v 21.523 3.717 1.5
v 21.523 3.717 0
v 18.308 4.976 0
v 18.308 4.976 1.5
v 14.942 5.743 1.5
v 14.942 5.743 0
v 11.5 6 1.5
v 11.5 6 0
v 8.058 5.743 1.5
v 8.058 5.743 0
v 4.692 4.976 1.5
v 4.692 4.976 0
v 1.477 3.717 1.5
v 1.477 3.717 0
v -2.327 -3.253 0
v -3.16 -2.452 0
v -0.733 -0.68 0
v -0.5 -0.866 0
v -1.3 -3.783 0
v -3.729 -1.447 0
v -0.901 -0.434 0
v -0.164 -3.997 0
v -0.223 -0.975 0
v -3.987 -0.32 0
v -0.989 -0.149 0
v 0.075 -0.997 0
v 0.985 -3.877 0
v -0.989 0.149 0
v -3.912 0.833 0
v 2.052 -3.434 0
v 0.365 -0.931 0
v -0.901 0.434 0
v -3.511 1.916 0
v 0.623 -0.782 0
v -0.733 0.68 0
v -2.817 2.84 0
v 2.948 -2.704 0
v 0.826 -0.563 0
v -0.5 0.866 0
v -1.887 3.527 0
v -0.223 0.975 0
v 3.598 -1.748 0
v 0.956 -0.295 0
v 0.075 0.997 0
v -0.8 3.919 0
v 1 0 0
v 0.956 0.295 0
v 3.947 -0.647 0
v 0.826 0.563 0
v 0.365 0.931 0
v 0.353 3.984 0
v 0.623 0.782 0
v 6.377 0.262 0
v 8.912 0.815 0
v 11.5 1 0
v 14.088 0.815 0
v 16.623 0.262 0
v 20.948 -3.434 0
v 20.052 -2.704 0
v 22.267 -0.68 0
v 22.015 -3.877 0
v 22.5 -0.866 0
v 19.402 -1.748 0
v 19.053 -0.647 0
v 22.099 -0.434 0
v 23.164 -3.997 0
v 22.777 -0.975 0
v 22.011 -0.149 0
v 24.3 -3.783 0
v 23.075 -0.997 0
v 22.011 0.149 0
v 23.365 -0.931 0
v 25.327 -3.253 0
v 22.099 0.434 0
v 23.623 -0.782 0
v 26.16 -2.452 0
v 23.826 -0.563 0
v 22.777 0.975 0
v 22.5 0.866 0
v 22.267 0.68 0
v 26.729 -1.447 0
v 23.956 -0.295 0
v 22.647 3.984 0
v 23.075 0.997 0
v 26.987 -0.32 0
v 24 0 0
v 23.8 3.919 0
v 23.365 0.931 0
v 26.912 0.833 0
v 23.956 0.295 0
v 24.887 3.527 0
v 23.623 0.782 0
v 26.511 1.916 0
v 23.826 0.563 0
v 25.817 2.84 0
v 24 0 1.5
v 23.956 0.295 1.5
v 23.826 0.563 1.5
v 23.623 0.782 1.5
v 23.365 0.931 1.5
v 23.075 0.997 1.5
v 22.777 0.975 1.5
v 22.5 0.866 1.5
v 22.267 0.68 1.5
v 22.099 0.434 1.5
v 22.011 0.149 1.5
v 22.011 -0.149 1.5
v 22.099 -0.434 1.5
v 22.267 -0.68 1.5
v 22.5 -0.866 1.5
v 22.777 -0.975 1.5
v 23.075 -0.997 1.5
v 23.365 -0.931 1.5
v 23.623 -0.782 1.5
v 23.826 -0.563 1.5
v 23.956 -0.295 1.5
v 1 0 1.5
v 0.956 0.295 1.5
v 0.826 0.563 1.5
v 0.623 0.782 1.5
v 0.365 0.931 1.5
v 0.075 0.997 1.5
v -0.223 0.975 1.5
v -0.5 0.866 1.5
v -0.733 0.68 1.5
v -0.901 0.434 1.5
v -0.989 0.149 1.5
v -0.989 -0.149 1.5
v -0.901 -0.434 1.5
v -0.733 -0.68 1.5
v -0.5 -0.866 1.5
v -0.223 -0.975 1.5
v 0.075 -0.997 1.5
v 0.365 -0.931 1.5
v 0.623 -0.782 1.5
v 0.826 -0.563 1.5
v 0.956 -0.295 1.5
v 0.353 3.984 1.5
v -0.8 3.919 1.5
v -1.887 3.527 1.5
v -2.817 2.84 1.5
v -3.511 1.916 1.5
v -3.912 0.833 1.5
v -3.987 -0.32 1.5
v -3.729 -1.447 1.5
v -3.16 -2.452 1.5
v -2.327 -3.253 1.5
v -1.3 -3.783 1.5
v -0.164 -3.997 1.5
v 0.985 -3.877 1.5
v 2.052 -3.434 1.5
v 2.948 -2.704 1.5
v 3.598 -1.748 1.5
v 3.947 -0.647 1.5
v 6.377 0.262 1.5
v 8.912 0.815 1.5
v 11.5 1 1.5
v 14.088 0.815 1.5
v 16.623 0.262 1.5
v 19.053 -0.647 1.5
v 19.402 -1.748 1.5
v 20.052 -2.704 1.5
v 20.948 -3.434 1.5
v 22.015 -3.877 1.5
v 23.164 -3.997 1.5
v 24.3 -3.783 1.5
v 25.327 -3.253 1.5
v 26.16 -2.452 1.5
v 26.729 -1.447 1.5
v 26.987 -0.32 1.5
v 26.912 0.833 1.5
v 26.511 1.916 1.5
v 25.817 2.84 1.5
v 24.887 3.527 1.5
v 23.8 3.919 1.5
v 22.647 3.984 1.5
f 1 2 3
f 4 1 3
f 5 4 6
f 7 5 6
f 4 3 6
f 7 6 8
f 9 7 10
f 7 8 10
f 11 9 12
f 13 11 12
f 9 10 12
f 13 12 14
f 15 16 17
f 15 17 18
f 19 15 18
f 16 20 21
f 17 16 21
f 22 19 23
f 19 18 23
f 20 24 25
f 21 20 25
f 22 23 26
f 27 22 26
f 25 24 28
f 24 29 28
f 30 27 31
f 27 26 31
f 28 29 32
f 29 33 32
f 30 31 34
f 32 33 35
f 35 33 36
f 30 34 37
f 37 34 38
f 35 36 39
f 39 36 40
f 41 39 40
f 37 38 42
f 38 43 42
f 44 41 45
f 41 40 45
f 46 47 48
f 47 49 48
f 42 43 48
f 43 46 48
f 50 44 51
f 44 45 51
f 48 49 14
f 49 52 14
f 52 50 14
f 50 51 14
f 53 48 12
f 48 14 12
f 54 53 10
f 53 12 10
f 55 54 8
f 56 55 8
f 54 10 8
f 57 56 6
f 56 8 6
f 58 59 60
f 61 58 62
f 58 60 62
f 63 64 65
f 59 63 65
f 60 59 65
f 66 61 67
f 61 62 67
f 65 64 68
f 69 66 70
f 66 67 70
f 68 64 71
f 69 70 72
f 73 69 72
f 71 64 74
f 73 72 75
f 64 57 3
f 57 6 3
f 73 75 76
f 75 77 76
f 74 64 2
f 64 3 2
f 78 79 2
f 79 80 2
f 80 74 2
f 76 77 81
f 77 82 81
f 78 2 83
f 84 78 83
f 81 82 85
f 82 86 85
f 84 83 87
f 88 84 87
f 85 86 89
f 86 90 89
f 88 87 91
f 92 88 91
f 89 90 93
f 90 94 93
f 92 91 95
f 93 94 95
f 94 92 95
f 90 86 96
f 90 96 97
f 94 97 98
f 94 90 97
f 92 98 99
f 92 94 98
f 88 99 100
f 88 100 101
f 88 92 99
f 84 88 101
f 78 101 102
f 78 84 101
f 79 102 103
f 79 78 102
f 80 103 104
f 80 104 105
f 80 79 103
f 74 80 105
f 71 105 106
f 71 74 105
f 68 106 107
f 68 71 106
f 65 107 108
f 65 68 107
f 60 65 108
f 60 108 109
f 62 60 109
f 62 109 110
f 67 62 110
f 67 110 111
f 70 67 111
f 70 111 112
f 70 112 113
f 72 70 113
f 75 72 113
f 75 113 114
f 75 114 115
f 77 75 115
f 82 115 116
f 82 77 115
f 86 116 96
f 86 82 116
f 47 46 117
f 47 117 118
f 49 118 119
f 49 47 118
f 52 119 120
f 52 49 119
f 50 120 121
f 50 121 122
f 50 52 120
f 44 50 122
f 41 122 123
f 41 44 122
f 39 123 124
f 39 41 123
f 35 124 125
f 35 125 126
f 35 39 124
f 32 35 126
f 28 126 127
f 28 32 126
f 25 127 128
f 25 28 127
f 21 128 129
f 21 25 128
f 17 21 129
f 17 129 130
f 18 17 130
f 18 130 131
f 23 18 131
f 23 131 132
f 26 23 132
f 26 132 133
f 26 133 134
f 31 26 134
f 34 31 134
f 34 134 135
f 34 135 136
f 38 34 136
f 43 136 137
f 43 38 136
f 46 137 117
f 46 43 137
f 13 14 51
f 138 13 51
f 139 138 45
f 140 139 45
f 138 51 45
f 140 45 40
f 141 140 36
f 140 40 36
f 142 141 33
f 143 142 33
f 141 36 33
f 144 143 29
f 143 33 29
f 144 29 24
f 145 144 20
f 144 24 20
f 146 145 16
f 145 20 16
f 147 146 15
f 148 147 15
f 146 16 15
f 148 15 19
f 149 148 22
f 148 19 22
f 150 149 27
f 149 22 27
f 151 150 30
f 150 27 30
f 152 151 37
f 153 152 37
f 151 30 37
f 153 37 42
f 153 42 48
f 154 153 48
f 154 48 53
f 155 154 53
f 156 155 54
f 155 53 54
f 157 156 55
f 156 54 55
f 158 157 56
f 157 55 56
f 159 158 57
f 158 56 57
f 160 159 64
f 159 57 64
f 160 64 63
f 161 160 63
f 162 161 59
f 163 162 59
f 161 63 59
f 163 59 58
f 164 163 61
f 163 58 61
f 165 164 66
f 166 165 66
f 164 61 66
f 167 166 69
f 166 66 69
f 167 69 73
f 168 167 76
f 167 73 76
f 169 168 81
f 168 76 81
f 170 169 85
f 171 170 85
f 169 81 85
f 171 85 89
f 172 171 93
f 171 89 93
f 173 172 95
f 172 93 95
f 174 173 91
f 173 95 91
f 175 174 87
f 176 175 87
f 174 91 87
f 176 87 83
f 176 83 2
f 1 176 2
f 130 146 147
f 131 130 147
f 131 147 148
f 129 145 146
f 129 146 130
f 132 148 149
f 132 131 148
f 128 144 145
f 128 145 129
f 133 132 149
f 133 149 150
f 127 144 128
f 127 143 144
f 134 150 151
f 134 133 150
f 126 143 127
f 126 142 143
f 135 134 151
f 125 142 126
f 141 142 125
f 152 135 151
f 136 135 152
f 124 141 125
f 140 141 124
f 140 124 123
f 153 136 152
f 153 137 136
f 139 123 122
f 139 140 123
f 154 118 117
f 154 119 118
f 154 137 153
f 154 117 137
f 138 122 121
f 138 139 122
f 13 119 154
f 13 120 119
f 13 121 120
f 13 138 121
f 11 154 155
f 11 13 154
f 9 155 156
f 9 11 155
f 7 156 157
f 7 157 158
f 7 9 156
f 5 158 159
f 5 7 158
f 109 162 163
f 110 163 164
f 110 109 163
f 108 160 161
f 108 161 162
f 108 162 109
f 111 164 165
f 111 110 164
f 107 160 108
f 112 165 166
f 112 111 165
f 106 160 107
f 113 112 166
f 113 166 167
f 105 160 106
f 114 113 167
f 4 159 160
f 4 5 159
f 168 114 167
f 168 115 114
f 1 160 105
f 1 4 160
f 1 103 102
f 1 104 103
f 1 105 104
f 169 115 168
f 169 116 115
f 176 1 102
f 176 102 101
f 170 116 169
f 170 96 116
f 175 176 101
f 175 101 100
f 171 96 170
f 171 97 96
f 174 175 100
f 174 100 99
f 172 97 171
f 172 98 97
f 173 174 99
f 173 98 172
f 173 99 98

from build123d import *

# Parameters (mm, degrees)
SKETCH1_R           = 1
BOSS_EXTRUDE1_DEPTH = 1.5


with BuildPart() as part:
    # Sketch1 → Boss-Extrude1 (new body)
    with BuildSketch(Plane.XY):
        with BuildLine():
            ThreePointArc((1.477428659, 3.717150059), (-3.481097701, -1.970268712), (3.947365166, -0.646767534))
            ThreePointArc((3.947365166, -0.646767534), (11.5, 1), (19.052634834, -0.646767534))
            ThreePointArc((19.052634834, -0.646767534), (26.481097701, -1.970268712), (21.522571341, 3.717150059))
            ThreePointArc((21.522571341, 3.717150059), (11.5, 6), (1.477428659, 3.717150059))
        make_face()
        Circle(SKETCH1_R, mode=Mode.SUBTRACT)
        with Locations((23, 0)):
            Circle(SKETCH1_R, mode=Mode.SUBTRACT)
    extrude(amount=BOSS_EXTRUDE1_DEPTH)


solid = part.part
